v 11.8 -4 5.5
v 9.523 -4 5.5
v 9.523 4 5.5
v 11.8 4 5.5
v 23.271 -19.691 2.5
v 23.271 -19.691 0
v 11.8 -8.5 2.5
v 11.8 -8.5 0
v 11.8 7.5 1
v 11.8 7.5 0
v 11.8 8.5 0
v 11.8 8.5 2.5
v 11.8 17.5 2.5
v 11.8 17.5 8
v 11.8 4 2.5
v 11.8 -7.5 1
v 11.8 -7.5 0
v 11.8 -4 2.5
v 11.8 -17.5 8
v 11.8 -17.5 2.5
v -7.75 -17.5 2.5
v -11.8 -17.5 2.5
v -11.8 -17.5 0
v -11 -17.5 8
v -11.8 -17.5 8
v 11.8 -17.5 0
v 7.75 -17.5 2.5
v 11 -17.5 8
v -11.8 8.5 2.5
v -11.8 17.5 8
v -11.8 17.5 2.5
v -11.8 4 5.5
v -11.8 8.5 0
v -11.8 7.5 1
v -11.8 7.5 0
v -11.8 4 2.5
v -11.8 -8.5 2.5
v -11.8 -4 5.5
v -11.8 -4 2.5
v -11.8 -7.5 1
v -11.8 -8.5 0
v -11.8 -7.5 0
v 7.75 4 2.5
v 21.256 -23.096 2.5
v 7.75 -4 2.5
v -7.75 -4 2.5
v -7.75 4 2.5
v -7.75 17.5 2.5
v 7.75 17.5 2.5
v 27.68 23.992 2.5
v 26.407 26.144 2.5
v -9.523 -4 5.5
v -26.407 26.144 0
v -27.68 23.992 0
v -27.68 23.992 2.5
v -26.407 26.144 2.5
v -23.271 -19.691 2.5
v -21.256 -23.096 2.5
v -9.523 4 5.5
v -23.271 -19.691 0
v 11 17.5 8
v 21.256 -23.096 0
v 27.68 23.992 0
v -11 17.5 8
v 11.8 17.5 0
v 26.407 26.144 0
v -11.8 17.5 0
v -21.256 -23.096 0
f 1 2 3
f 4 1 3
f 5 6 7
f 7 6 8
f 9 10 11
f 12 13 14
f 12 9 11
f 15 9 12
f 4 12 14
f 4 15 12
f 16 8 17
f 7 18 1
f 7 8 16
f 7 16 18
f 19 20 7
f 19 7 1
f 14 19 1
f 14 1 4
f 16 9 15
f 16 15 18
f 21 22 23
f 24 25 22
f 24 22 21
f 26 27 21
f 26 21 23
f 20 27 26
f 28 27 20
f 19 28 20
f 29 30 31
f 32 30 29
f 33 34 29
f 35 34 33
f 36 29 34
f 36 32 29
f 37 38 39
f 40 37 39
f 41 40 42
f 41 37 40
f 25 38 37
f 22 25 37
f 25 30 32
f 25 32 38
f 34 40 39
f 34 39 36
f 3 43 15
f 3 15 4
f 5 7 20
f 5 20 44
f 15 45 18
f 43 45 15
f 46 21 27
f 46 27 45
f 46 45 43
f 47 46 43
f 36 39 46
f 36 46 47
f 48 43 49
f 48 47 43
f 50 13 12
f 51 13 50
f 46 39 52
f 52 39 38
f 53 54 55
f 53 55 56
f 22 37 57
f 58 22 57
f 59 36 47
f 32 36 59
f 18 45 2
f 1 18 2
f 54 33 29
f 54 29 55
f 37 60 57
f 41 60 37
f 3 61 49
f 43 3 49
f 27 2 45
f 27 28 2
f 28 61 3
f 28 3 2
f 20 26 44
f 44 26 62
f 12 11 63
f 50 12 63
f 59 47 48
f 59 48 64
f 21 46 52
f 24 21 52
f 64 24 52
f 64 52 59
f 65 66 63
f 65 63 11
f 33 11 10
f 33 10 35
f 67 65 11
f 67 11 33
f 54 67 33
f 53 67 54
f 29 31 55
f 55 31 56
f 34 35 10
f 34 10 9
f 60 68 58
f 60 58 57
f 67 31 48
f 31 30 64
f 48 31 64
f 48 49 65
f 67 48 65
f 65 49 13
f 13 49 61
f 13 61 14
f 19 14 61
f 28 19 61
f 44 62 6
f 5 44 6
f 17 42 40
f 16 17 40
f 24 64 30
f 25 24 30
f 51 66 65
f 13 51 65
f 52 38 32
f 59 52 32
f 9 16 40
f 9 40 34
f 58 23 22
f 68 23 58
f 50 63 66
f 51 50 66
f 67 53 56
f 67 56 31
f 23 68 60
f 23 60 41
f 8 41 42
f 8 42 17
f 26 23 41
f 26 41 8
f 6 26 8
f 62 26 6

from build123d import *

# Parameters (mm, degrees)
F1_DEPTH = 17.5
F2_W     = 8
F2_H     = 3
F2_W_2   = 15
F2_H_2   = 1
F3_DEPTH = 50
F5_DEPTH = 2.5


# Not quite as in the source:
# - a pattern or mirror of a feature is missing from the dataset's text; its kind, count and spacing are read off the source's solid


with BuildPart() as f1:
    # F0 (on Front) → F1 (new body, symmetric)
    with BuildSketch(Plane.XZ):
        Polygon((-11.8, 0), (0, 0), (11.8, 0), (11.8, 8), (11, 8), (7.75, 2.5), (0, 2.5), (-7.75, 2.5), (-11, 8), (-11.8, 8), align=None)
    extrude(amount=F1_DEPTH, both=True)

    # F2 (on Right) → F3 (cut, symmetric)
    with BuildSketch(Plane.YZ):
        with Locations((0, 4)):
            Rectangle(F2_W, F2_H)
        with Locations((0, 0.5)):
            Rectangle(F2_W_2, F2_H_2)
    extrude(amount=F3_DEPTH, both=True, mode=Mode.SUBTRACT)

    # F4 (on Top) → F5 (join)
    with BuildSketch(Plane.XY):
        Polygon((26.4065545634, 26.1439538722), (11.8, 17.5), (11.8, 8.5), (27.6797758895, 23.9924642824), align=None)
        Polygon((11.8, -8.5), (11.8, -17.5), (21.2564246661, -23.0961793217), (23.2712739184, -19.6914867497), align=None)
    f5 = extrude(amount=F5_DEPTH)

    # F5_copies: F5 across plane
    add(f5.mirror(Plane(origin=(0, 0, 0), x_dir=(0, 0, -1), z_dir=(-1, 0, 0))))


solid = f1.part
